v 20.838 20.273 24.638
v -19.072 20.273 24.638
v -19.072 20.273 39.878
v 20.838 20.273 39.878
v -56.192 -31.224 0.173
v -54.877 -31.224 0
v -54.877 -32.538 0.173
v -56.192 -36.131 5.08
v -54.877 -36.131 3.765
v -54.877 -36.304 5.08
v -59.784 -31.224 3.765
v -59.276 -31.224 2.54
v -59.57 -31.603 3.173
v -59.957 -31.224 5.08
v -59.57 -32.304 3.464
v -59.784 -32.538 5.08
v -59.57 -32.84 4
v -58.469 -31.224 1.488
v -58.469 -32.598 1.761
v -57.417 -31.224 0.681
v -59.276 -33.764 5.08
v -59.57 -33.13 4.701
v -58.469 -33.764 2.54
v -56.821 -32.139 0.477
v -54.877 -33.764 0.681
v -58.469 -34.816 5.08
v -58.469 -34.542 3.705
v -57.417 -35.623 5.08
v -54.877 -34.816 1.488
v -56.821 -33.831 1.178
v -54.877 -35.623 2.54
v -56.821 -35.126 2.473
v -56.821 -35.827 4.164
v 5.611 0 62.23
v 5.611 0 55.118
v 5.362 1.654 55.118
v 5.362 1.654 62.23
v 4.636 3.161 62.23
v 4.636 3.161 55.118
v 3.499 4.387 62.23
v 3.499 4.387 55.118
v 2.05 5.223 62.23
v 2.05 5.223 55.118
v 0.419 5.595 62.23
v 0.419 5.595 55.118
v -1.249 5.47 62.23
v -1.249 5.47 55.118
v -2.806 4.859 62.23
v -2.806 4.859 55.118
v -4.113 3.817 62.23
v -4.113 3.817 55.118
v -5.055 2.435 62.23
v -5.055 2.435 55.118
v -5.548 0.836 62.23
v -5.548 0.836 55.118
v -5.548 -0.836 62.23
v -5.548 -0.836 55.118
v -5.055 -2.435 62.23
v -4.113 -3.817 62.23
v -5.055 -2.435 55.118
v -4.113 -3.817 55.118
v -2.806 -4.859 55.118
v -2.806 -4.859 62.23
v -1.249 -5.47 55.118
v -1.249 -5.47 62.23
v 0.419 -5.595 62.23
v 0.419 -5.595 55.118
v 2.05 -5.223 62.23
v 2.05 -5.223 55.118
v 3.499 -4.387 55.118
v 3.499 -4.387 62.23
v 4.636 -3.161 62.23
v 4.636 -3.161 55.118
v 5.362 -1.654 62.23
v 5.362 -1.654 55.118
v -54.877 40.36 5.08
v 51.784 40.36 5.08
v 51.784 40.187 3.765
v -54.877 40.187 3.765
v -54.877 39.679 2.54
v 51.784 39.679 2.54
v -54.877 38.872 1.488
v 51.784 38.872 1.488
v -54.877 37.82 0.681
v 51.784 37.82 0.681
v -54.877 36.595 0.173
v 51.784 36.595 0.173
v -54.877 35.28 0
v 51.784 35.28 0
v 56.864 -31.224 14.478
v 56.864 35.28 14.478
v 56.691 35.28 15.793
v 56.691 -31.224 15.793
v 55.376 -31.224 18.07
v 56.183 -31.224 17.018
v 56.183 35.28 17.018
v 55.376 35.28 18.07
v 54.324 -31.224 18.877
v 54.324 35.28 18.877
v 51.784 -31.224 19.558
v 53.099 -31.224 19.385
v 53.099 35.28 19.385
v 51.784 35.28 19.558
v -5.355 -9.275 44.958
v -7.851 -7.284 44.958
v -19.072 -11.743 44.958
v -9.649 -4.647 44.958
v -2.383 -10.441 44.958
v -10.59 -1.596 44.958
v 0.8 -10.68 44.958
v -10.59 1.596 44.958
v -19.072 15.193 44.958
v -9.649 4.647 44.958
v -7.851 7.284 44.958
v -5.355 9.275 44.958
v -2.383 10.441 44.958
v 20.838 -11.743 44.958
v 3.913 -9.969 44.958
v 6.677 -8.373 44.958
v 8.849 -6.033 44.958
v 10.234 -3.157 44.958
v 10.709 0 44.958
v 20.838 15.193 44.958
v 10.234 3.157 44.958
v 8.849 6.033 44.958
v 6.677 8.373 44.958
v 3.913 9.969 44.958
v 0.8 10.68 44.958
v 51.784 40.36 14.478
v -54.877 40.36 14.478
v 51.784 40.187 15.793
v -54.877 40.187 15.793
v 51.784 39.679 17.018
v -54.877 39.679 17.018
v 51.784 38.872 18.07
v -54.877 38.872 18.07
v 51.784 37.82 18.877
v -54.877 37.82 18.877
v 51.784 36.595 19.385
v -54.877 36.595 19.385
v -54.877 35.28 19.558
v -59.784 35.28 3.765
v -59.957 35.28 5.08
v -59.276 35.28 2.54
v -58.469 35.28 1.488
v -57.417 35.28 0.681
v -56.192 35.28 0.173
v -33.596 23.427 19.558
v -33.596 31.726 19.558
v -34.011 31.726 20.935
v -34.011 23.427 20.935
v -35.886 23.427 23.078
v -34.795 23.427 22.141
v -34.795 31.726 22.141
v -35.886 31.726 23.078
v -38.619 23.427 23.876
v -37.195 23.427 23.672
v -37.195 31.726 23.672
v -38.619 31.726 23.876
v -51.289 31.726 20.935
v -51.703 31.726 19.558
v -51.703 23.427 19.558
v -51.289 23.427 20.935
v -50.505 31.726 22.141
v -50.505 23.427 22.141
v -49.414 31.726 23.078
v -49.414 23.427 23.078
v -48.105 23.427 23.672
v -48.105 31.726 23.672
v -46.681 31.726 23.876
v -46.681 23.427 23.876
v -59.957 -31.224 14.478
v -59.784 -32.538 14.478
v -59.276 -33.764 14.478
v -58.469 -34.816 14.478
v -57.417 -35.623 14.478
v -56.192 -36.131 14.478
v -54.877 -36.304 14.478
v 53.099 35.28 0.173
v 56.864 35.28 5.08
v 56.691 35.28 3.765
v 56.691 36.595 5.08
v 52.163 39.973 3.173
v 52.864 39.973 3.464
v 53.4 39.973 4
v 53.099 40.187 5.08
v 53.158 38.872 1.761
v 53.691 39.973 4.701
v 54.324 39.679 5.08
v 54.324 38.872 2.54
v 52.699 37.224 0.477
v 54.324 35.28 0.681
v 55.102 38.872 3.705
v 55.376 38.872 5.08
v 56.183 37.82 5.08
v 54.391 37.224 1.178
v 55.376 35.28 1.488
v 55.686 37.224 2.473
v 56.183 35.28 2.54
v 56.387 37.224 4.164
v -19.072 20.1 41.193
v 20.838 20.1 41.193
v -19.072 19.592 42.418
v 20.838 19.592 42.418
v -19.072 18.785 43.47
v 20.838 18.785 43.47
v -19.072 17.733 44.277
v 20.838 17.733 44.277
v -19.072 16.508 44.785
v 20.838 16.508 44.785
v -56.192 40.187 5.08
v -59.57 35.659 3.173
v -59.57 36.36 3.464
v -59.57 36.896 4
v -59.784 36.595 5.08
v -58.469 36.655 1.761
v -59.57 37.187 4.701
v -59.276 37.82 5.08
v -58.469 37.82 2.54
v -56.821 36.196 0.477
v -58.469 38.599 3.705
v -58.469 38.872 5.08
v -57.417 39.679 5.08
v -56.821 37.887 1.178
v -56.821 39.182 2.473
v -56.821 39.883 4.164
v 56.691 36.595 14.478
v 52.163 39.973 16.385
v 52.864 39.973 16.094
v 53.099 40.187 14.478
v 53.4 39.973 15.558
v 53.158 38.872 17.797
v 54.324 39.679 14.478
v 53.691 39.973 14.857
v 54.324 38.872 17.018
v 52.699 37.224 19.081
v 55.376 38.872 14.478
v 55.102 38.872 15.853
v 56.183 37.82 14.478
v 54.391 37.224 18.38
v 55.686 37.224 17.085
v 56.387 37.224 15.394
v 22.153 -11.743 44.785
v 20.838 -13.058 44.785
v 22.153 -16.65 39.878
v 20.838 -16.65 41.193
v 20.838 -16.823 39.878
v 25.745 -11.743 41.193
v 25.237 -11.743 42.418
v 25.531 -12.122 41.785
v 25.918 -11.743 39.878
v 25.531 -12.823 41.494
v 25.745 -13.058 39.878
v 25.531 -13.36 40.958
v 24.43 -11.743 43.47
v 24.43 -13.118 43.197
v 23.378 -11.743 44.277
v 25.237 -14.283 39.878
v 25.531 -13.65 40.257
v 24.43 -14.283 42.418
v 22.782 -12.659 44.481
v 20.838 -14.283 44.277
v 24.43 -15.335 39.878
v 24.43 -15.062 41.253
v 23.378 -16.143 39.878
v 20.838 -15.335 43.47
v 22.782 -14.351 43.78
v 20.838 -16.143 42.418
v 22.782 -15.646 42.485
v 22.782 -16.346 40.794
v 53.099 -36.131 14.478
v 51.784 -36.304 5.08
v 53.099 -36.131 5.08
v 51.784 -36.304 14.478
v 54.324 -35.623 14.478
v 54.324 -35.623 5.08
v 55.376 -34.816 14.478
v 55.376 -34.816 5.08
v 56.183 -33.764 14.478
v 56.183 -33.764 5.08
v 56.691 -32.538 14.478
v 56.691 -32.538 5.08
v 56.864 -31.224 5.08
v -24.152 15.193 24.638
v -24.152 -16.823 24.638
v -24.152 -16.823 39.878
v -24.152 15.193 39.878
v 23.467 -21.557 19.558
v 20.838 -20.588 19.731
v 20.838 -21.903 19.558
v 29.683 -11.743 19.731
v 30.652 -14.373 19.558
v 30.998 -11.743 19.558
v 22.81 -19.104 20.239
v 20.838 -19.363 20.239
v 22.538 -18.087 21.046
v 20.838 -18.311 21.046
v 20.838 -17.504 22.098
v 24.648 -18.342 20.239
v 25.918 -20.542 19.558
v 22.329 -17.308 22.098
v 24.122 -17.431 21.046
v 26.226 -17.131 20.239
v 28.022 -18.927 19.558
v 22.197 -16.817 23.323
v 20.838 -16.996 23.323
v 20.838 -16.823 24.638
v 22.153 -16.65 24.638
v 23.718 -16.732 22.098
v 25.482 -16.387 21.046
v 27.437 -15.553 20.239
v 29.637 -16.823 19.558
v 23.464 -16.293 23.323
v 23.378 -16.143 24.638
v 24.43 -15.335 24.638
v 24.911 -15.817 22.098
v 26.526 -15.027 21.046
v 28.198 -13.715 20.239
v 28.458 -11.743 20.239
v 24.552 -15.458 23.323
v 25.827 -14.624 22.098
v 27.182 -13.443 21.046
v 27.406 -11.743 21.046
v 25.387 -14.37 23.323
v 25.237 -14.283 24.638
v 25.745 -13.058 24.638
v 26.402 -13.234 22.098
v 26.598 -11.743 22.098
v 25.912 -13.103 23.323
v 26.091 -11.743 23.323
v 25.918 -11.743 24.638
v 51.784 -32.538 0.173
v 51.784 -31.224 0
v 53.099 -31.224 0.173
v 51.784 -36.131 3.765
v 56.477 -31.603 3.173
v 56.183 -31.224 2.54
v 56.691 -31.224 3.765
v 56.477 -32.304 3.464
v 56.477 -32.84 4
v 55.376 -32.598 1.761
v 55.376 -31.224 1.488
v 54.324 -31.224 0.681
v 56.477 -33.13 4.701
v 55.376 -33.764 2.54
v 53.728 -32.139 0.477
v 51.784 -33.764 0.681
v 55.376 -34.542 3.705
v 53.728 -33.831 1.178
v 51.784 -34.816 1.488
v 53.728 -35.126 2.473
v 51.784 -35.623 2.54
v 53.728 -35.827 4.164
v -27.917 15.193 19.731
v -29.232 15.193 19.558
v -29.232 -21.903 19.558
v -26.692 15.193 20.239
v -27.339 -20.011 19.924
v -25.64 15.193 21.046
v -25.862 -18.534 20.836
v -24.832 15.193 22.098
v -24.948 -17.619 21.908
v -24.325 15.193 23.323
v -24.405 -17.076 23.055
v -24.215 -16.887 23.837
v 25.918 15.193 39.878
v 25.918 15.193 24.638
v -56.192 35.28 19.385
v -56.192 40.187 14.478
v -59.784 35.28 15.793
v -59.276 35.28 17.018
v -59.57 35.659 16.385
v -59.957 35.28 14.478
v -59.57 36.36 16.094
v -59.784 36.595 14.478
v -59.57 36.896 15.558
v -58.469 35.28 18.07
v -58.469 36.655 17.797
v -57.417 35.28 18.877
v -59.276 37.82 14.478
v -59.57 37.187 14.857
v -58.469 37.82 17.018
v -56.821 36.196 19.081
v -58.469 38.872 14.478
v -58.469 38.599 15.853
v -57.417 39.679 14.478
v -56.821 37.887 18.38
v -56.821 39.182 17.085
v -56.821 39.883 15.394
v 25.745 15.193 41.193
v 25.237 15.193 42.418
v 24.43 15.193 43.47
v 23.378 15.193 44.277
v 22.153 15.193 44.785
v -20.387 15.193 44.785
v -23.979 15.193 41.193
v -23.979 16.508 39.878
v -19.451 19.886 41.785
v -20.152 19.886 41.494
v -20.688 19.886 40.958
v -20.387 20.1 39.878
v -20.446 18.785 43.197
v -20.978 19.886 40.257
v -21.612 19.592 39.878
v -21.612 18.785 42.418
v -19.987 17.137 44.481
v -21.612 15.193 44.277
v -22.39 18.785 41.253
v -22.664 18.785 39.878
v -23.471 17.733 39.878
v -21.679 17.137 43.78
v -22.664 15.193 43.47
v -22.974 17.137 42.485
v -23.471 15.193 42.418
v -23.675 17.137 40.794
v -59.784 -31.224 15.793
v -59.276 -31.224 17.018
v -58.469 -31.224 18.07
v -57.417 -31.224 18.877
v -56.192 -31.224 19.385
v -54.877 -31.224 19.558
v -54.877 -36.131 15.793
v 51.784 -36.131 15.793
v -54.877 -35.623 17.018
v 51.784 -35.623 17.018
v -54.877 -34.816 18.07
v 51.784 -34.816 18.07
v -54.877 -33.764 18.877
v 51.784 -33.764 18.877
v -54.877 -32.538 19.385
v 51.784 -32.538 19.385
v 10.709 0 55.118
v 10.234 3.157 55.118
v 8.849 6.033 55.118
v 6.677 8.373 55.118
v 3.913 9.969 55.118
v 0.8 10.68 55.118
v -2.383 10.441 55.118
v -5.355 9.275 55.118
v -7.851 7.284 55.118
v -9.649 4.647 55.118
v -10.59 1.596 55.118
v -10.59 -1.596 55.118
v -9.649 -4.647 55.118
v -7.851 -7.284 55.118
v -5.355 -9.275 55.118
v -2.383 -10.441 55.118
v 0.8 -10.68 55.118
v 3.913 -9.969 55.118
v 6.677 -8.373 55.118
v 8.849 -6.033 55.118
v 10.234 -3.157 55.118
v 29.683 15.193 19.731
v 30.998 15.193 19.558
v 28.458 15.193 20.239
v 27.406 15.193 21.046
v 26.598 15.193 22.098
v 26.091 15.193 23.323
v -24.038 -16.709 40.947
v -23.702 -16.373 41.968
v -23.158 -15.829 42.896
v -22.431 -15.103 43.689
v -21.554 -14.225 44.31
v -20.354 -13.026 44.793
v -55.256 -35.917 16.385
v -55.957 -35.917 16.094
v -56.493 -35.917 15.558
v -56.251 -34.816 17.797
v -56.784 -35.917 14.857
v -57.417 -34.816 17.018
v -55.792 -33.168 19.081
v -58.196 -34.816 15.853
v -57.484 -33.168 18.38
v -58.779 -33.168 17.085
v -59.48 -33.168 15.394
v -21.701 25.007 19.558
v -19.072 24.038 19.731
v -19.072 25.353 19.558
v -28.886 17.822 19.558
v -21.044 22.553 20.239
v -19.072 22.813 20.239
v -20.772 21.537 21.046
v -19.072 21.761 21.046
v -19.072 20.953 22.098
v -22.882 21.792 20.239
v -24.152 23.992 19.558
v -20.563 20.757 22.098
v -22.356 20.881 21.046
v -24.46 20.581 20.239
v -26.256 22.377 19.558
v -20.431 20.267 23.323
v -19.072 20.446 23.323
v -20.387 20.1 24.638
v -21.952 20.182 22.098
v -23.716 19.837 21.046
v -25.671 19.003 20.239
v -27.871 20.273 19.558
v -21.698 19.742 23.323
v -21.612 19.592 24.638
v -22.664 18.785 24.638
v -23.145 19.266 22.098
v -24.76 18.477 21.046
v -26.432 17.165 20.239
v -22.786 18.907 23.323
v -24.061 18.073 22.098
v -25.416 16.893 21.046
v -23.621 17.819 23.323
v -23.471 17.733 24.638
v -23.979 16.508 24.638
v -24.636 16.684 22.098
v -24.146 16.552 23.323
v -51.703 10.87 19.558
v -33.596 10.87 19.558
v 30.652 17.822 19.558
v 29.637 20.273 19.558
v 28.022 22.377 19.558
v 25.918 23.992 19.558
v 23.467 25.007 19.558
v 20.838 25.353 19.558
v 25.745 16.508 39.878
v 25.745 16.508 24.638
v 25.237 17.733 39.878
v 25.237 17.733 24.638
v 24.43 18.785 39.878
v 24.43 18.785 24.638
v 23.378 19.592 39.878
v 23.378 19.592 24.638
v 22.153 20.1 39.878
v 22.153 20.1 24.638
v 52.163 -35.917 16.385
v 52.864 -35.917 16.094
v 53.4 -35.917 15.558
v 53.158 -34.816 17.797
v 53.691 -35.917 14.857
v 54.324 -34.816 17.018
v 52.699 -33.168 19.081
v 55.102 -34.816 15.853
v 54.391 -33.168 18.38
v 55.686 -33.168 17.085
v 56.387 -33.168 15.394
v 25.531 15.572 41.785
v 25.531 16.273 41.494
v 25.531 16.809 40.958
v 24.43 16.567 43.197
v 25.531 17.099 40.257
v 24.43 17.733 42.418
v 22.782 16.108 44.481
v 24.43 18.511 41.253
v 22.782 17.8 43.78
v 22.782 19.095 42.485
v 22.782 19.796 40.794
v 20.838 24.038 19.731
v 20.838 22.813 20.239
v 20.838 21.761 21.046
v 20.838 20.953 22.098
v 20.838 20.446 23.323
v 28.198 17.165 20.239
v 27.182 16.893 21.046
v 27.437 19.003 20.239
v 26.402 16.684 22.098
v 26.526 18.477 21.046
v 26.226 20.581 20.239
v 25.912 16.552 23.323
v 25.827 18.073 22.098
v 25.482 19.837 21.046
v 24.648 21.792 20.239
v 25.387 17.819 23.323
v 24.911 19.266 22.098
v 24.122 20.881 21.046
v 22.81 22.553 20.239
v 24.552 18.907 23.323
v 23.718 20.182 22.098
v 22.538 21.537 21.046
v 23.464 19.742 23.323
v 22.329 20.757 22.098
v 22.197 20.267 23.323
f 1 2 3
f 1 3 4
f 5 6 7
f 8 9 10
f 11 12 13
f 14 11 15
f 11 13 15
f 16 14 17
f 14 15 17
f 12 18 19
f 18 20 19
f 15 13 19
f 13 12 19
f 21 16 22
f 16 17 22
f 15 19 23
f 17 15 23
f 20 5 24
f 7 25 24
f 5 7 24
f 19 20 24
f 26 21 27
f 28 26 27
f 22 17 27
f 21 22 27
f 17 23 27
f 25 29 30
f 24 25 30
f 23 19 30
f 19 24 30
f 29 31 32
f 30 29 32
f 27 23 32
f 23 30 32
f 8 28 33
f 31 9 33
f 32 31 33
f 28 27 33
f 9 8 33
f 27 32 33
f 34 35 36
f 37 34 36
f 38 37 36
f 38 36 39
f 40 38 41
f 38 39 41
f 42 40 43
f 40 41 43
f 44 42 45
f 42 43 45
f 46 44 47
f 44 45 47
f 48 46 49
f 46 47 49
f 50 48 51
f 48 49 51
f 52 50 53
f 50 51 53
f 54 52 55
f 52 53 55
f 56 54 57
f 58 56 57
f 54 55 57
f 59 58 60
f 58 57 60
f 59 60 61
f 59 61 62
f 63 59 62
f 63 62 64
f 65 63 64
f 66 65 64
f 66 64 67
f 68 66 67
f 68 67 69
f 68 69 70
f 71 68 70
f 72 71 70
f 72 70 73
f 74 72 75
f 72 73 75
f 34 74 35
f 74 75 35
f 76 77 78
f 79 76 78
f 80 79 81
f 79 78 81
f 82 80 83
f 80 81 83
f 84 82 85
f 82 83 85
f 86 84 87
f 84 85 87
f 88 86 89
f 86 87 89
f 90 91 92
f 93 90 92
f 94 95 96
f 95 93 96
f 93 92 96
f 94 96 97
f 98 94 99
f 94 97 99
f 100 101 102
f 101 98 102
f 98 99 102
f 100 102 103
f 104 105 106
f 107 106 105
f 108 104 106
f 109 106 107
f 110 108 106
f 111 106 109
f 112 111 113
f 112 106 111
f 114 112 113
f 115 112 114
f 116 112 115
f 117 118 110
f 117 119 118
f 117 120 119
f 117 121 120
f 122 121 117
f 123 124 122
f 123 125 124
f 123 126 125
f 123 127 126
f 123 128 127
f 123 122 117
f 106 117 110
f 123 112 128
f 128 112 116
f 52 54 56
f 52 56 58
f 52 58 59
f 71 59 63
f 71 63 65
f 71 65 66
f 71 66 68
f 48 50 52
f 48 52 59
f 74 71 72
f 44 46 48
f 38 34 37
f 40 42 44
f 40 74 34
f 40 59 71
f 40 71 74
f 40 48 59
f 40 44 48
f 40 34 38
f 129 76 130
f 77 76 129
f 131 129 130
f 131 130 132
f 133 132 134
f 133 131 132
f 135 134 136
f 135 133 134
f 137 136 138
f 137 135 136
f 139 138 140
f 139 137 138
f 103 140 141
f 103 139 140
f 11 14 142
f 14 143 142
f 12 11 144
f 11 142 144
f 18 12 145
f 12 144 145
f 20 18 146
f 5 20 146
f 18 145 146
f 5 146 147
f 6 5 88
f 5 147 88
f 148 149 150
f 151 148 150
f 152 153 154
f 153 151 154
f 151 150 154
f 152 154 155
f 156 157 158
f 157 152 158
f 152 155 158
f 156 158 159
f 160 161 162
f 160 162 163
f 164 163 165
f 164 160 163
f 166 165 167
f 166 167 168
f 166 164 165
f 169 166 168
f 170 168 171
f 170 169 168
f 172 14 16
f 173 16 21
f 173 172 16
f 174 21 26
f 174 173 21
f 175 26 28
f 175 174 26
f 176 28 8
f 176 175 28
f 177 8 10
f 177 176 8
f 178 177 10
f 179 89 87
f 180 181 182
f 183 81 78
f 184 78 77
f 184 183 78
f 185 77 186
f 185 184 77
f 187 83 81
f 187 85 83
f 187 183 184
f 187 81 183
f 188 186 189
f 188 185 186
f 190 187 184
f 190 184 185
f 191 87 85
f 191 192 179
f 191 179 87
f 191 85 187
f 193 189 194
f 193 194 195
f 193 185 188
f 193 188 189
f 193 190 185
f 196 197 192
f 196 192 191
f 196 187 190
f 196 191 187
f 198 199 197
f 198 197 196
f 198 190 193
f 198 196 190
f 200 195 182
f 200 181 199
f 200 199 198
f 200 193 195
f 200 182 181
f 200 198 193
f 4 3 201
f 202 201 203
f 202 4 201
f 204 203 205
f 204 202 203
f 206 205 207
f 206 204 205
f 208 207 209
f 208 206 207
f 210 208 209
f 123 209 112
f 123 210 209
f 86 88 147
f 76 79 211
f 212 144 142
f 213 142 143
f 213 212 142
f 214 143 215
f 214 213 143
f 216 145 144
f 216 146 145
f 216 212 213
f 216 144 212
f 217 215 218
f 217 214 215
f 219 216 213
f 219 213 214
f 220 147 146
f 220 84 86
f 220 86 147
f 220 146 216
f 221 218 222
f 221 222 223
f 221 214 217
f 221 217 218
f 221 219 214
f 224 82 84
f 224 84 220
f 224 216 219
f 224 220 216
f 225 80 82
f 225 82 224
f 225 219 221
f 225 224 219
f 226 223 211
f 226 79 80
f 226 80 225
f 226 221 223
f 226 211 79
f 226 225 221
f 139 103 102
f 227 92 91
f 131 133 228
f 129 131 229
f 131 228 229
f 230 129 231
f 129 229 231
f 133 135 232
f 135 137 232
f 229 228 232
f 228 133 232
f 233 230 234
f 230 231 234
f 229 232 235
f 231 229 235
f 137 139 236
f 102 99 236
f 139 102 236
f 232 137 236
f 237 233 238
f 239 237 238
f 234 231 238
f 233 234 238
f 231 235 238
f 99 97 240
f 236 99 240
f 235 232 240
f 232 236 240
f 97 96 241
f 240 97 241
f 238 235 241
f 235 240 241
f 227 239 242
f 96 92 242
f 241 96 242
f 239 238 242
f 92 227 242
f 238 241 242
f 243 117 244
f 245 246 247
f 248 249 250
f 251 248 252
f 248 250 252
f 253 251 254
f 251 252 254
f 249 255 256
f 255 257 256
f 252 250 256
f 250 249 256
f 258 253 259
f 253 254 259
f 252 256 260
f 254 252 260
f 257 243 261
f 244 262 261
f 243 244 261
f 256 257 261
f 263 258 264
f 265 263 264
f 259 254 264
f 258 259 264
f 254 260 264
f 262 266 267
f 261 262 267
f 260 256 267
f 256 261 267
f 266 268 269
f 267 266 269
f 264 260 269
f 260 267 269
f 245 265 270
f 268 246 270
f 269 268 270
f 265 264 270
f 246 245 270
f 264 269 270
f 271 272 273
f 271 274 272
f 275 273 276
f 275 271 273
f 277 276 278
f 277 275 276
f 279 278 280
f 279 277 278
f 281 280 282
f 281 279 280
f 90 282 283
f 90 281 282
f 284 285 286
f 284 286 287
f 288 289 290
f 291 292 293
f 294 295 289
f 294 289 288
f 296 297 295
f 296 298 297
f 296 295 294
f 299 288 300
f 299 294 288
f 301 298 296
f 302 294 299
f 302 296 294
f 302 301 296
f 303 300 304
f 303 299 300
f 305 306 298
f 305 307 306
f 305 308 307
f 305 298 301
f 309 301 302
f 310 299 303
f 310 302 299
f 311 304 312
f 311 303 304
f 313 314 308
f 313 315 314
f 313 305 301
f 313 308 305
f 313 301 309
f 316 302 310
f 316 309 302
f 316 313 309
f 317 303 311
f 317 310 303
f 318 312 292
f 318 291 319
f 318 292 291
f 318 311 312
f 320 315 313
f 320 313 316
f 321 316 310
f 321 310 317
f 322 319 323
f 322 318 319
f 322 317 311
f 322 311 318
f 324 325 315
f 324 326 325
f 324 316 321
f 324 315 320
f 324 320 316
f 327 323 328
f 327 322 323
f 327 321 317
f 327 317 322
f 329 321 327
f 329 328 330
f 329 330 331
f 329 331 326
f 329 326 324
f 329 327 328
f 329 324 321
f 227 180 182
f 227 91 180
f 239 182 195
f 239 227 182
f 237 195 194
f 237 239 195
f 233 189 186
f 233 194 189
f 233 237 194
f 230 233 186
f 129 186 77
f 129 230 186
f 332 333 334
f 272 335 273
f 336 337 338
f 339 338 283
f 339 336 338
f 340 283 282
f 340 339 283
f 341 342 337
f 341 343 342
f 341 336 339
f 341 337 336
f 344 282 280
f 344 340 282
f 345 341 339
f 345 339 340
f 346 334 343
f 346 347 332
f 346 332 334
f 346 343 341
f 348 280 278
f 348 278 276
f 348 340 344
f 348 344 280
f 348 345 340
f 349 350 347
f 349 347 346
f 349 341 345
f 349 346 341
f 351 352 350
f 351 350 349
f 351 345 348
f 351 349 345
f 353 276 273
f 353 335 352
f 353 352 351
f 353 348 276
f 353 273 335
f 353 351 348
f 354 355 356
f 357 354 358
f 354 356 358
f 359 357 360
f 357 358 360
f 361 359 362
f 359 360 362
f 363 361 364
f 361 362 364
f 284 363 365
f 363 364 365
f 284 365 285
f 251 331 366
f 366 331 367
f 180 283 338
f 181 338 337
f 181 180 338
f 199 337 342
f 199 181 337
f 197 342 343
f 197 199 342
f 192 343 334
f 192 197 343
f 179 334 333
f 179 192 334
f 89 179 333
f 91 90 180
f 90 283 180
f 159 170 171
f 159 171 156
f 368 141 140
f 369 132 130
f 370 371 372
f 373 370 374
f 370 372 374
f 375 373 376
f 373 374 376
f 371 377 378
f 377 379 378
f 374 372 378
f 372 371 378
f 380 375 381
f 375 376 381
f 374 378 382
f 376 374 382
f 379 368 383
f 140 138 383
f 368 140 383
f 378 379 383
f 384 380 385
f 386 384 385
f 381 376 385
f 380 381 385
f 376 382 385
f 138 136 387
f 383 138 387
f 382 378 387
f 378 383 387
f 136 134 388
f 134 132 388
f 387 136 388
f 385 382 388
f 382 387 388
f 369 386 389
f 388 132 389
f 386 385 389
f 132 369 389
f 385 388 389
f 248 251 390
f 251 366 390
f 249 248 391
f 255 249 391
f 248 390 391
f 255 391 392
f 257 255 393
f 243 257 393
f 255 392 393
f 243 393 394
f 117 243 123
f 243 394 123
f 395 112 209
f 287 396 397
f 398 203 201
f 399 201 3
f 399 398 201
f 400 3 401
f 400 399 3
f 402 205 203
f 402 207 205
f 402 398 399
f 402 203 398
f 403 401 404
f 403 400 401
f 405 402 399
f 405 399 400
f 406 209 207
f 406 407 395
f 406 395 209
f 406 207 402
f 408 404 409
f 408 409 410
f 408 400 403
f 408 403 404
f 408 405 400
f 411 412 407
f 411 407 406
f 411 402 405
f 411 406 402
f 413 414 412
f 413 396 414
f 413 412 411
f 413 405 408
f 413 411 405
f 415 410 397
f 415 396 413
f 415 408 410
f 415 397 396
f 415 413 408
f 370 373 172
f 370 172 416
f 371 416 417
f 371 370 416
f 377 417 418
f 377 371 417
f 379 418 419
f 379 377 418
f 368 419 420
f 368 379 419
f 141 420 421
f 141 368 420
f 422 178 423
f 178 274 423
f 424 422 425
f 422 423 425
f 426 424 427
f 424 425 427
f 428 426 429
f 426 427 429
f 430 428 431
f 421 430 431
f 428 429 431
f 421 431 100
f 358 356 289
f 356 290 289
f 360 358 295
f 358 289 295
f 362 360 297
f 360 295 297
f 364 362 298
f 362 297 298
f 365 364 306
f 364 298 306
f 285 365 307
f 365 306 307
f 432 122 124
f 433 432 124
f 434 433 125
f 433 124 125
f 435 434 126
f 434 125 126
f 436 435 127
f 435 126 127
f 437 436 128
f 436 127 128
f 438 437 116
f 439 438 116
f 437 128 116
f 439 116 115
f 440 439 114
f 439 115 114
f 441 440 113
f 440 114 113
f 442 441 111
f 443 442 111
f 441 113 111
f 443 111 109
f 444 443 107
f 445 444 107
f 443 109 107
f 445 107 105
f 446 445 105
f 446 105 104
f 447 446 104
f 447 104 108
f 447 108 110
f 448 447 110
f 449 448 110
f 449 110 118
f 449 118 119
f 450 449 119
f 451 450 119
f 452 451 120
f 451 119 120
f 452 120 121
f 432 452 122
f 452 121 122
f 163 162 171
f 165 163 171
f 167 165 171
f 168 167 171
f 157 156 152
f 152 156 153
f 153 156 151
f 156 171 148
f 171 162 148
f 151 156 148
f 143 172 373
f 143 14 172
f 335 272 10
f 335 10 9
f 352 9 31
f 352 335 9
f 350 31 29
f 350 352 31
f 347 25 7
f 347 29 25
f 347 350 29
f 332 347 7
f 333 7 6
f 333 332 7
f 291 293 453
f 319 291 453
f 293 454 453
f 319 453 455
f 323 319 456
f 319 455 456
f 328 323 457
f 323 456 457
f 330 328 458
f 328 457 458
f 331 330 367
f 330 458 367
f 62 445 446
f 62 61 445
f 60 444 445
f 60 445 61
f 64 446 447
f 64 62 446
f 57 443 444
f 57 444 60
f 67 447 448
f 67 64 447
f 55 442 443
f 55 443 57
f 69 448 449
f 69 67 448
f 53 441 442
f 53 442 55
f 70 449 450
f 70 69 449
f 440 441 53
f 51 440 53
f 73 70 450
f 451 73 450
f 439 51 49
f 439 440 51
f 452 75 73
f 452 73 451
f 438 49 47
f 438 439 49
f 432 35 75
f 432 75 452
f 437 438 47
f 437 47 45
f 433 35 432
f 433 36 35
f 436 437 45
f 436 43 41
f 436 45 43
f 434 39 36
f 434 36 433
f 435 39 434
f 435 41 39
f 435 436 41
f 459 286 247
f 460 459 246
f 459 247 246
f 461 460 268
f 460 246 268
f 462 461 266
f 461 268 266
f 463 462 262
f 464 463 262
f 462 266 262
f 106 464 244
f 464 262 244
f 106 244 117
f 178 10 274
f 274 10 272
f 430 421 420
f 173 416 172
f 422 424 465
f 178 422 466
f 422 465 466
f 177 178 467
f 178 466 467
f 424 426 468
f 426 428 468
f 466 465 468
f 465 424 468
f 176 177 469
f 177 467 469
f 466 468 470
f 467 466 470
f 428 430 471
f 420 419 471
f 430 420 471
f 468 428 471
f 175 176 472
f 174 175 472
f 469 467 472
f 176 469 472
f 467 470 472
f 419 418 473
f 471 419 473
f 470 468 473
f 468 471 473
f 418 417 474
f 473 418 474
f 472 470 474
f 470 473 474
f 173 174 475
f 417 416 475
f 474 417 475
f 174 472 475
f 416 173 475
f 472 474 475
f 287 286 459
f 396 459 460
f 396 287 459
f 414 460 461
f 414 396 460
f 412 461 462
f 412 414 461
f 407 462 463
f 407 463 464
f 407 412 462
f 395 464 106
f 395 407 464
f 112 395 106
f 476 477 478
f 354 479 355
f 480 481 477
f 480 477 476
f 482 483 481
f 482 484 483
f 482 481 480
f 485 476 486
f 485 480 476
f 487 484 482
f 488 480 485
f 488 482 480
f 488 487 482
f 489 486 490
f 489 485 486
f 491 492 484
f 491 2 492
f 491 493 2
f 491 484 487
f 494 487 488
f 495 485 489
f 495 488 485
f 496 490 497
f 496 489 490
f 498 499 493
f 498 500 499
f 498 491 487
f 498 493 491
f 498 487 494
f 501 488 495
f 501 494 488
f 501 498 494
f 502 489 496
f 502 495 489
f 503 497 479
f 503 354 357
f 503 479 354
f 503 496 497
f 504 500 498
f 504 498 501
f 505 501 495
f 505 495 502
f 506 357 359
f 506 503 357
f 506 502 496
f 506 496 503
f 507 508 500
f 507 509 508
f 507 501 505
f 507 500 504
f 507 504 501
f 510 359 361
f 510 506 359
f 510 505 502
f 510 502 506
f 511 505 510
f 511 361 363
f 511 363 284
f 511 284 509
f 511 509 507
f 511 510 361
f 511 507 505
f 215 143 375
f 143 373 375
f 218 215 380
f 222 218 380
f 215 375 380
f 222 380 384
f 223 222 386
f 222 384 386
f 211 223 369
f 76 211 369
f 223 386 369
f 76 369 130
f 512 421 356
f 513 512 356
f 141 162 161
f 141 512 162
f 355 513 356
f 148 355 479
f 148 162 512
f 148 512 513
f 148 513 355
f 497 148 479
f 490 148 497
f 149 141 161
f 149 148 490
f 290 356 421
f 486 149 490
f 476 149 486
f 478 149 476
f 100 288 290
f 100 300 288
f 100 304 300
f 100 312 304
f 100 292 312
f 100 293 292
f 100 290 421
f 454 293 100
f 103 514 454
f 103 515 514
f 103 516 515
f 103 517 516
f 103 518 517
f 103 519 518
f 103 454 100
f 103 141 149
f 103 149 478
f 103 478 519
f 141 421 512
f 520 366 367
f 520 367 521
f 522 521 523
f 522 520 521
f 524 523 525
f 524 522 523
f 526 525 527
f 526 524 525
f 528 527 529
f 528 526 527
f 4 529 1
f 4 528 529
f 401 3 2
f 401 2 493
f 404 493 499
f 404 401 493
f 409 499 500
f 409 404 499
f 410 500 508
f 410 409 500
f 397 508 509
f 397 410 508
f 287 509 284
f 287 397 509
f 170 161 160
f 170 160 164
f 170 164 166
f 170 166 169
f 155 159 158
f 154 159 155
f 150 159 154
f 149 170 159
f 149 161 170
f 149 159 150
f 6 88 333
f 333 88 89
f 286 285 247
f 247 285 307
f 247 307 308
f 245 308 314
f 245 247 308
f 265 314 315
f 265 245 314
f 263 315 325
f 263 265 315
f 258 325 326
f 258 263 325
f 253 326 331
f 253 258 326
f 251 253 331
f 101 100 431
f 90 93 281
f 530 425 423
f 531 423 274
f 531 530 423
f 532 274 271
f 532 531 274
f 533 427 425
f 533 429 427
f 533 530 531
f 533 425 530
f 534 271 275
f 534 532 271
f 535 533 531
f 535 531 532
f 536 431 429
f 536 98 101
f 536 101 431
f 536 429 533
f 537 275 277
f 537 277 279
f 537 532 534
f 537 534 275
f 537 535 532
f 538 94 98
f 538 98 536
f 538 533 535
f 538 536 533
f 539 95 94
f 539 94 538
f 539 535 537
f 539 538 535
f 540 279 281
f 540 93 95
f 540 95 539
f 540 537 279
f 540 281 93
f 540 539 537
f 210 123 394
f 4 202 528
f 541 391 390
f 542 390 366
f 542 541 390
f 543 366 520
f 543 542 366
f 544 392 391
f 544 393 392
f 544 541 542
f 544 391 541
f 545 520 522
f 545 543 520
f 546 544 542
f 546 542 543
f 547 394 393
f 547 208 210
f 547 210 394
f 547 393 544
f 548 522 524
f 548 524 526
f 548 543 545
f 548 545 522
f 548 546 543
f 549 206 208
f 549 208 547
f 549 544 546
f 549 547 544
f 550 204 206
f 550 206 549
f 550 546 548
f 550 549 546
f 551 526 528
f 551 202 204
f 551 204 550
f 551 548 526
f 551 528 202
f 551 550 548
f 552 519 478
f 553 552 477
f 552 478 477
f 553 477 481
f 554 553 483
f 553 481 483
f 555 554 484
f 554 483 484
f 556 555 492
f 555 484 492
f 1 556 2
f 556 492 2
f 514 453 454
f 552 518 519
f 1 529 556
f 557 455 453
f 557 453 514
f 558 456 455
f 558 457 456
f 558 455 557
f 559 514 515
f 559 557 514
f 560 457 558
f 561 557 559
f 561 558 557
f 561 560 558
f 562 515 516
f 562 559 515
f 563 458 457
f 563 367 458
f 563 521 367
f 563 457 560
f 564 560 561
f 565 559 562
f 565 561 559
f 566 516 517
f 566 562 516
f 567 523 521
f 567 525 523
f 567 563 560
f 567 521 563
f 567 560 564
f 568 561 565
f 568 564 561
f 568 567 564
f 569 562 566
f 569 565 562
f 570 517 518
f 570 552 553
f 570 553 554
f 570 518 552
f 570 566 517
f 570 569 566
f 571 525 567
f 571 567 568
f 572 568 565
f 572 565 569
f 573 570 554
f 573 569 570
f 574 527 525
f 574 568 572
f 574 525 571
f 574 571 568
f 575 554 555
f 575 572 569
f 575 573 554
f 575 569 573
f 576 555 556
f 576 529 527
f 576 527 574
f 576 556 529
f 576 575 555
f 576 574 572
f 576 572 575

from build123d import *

# Parameters (mm, degrees)
F0_W        = 116.8206892908
F0_H        = 76.6635760665
F1_DEPTH    = 19.558
F2_R        = 5.08
F3_W        = 50.0696562231
F3_H        = 37.0959769934
F4_DEPTH    = 25.4
F5_F1_R     = 5.08
F5_F2_R     = 5.08
F6_W        = 18.107265234
F6_H        = 8.2995928824
F7_DEPTH    = 4.318
F8_T1_DEPTH = 33.4122171977
F9_R        = 10.7094586845
F10_DEPTH   = 10.16
F11_R       = 5.6111694278
F12_DEPTH   = 7.112


# Not quite as in the source:
# - a fillet or chamfer that OpenCascade refuses, or shapes differently, is made with other operations: its cross-section is extruded or revolved along the edge and cut away or added


with BuildPart() as f1:
    # F0 (on Top) → F1 (new body)
    with BuildSketch(Plane.XY):
        with Locations((-1.5465151519, 2.0281374454)):
            Rectangle(F0_W, F0_H)
    extrude(amount=F1_DEPTH)

    # F2
    f2_edges = [f1.edges().sort_by_distance(p)[0] for p in [
        (56.863829, 2.028137, 19.558),
        (-1.546515, 40.359925, 19.558),
        (-59.95686, 2.028137, 19.558),
        (-1.546515, -36.303651, 19.558),
        (-1.546515, -36.303651, 0),
        (56.863829, 2.028137, 0),
        (-1.546515, 40.359925, 0),
        (-59.95686, 2.028137, 0),
        (-59.95686, 40.359925, 9.779),
        (-59.95686, -36.303651, 9.779),
        (56.863829, 40.359925, 9.779),
        (56.863829, -36.303651, 9.779),
    ]]
    fillet(f2_edges, radius=F2_R)

    # F3 (on face) → F4 (join)
    with BuildSketch(Plane.XY.offset(19.558)):
        with Locations((0.8830688894, 1.7247768119)):
            Rectangle(F3_W, F3_H)
    extrude(amount=F4_DEPTH)

    # F5: fillet of radius 5.08 on 10 edges, made by hand

    # F5_f1
    f5_f1_edges = [f1.edges().sort_by_distance(p)[0] for p in [
        (0.8830688894, -16.8232116848, 44.958),
        (-24.1517592221, 1.7247768119, 44.958),
        (0.8830688894, 20.2727653086, 44.958),
        (25.9178970009, 1.7247768119, 44.958),
        (25.9178970009, -16.8232116848, 32.258),
        (25.9178970009, 20.2727653086, 32.258),
        (-24.1517592221, 20.2727653086, 32.258),
    ]]
    fillet(f5_f1_edges, radius=F5_F1_R)

    # F5_f2
    f5_f2_edges = [f1.edges().sort_by_distance(p)[0] for p in [
        (25.9178970009, 1.7247768119, 19.558),
        (-24.1517592221, -0.8152231881, 19.558),
        (0.8830688894, 20.2727653086, 19.558),
        (24.4299994493, 18.784867757, 19.558),
        (-22.6638616706, 18.784867757, 19.558),
        (24.4299994493, -15.3353141333, 19.558),
    ]]
    fillet(f5_f2_edges, radius=F5_F2_R)

    # F6 (on face) → F7 (join)
    with BuildSketch(Plane.XY.offset(19.558)):
        with Locations((-42.6498092711, 27.5764670223)):
            Rectangle(F6_W, F6_H)
    extrude(amount=F7_DEPTH)

    # F8: fillet of radius 5.08 on 2 edges, made by hand

    # F8_s2 → F8_t1 (cut)
    with BuildSketch(Plane.XZ.offset(-44.2825756211)):
        with BuildLine():
            ThreePointArc((-51.7034418881, 19.558), (-49.9926718469, 22.6481007256), (-46.680917025, 23.876))
            Line((-46.680917025, 23.876), (-51.7034418881, 23.876))
            Line((-51.7034418881, 23.876), (-51.7034418881, 19.558))
        make_face()
        with BuildLine():
            ThreePointArc((-33.5961766541, 19.558), (-35.3069466953, 22.6481007256), (-38.6187015172, 23.876))
            Line((-38.6187015172, 23.876), (-33.5961766541, 23.876))
            Line((-33.5961766541, 23.876), (-33.5961766541, 19.558))
        make_face()
    extrude(amount=F8_T1_DEPTH, mode=Mode.SUBTRACT)

    # F9 (on face) → F10 (join)
    with BuildSketch(Plane.XY.offset(44.958)):
        Circle(F9_R)
    extrude(amount=F10_DEPTH)

    # F11 (on face) → F12 (join)
    with BuildSketch(Plane.XY.offset(55.118)):
        Circle(F11_R)
    extrude(amount=F12_DEPTH)


solid = f1.part
